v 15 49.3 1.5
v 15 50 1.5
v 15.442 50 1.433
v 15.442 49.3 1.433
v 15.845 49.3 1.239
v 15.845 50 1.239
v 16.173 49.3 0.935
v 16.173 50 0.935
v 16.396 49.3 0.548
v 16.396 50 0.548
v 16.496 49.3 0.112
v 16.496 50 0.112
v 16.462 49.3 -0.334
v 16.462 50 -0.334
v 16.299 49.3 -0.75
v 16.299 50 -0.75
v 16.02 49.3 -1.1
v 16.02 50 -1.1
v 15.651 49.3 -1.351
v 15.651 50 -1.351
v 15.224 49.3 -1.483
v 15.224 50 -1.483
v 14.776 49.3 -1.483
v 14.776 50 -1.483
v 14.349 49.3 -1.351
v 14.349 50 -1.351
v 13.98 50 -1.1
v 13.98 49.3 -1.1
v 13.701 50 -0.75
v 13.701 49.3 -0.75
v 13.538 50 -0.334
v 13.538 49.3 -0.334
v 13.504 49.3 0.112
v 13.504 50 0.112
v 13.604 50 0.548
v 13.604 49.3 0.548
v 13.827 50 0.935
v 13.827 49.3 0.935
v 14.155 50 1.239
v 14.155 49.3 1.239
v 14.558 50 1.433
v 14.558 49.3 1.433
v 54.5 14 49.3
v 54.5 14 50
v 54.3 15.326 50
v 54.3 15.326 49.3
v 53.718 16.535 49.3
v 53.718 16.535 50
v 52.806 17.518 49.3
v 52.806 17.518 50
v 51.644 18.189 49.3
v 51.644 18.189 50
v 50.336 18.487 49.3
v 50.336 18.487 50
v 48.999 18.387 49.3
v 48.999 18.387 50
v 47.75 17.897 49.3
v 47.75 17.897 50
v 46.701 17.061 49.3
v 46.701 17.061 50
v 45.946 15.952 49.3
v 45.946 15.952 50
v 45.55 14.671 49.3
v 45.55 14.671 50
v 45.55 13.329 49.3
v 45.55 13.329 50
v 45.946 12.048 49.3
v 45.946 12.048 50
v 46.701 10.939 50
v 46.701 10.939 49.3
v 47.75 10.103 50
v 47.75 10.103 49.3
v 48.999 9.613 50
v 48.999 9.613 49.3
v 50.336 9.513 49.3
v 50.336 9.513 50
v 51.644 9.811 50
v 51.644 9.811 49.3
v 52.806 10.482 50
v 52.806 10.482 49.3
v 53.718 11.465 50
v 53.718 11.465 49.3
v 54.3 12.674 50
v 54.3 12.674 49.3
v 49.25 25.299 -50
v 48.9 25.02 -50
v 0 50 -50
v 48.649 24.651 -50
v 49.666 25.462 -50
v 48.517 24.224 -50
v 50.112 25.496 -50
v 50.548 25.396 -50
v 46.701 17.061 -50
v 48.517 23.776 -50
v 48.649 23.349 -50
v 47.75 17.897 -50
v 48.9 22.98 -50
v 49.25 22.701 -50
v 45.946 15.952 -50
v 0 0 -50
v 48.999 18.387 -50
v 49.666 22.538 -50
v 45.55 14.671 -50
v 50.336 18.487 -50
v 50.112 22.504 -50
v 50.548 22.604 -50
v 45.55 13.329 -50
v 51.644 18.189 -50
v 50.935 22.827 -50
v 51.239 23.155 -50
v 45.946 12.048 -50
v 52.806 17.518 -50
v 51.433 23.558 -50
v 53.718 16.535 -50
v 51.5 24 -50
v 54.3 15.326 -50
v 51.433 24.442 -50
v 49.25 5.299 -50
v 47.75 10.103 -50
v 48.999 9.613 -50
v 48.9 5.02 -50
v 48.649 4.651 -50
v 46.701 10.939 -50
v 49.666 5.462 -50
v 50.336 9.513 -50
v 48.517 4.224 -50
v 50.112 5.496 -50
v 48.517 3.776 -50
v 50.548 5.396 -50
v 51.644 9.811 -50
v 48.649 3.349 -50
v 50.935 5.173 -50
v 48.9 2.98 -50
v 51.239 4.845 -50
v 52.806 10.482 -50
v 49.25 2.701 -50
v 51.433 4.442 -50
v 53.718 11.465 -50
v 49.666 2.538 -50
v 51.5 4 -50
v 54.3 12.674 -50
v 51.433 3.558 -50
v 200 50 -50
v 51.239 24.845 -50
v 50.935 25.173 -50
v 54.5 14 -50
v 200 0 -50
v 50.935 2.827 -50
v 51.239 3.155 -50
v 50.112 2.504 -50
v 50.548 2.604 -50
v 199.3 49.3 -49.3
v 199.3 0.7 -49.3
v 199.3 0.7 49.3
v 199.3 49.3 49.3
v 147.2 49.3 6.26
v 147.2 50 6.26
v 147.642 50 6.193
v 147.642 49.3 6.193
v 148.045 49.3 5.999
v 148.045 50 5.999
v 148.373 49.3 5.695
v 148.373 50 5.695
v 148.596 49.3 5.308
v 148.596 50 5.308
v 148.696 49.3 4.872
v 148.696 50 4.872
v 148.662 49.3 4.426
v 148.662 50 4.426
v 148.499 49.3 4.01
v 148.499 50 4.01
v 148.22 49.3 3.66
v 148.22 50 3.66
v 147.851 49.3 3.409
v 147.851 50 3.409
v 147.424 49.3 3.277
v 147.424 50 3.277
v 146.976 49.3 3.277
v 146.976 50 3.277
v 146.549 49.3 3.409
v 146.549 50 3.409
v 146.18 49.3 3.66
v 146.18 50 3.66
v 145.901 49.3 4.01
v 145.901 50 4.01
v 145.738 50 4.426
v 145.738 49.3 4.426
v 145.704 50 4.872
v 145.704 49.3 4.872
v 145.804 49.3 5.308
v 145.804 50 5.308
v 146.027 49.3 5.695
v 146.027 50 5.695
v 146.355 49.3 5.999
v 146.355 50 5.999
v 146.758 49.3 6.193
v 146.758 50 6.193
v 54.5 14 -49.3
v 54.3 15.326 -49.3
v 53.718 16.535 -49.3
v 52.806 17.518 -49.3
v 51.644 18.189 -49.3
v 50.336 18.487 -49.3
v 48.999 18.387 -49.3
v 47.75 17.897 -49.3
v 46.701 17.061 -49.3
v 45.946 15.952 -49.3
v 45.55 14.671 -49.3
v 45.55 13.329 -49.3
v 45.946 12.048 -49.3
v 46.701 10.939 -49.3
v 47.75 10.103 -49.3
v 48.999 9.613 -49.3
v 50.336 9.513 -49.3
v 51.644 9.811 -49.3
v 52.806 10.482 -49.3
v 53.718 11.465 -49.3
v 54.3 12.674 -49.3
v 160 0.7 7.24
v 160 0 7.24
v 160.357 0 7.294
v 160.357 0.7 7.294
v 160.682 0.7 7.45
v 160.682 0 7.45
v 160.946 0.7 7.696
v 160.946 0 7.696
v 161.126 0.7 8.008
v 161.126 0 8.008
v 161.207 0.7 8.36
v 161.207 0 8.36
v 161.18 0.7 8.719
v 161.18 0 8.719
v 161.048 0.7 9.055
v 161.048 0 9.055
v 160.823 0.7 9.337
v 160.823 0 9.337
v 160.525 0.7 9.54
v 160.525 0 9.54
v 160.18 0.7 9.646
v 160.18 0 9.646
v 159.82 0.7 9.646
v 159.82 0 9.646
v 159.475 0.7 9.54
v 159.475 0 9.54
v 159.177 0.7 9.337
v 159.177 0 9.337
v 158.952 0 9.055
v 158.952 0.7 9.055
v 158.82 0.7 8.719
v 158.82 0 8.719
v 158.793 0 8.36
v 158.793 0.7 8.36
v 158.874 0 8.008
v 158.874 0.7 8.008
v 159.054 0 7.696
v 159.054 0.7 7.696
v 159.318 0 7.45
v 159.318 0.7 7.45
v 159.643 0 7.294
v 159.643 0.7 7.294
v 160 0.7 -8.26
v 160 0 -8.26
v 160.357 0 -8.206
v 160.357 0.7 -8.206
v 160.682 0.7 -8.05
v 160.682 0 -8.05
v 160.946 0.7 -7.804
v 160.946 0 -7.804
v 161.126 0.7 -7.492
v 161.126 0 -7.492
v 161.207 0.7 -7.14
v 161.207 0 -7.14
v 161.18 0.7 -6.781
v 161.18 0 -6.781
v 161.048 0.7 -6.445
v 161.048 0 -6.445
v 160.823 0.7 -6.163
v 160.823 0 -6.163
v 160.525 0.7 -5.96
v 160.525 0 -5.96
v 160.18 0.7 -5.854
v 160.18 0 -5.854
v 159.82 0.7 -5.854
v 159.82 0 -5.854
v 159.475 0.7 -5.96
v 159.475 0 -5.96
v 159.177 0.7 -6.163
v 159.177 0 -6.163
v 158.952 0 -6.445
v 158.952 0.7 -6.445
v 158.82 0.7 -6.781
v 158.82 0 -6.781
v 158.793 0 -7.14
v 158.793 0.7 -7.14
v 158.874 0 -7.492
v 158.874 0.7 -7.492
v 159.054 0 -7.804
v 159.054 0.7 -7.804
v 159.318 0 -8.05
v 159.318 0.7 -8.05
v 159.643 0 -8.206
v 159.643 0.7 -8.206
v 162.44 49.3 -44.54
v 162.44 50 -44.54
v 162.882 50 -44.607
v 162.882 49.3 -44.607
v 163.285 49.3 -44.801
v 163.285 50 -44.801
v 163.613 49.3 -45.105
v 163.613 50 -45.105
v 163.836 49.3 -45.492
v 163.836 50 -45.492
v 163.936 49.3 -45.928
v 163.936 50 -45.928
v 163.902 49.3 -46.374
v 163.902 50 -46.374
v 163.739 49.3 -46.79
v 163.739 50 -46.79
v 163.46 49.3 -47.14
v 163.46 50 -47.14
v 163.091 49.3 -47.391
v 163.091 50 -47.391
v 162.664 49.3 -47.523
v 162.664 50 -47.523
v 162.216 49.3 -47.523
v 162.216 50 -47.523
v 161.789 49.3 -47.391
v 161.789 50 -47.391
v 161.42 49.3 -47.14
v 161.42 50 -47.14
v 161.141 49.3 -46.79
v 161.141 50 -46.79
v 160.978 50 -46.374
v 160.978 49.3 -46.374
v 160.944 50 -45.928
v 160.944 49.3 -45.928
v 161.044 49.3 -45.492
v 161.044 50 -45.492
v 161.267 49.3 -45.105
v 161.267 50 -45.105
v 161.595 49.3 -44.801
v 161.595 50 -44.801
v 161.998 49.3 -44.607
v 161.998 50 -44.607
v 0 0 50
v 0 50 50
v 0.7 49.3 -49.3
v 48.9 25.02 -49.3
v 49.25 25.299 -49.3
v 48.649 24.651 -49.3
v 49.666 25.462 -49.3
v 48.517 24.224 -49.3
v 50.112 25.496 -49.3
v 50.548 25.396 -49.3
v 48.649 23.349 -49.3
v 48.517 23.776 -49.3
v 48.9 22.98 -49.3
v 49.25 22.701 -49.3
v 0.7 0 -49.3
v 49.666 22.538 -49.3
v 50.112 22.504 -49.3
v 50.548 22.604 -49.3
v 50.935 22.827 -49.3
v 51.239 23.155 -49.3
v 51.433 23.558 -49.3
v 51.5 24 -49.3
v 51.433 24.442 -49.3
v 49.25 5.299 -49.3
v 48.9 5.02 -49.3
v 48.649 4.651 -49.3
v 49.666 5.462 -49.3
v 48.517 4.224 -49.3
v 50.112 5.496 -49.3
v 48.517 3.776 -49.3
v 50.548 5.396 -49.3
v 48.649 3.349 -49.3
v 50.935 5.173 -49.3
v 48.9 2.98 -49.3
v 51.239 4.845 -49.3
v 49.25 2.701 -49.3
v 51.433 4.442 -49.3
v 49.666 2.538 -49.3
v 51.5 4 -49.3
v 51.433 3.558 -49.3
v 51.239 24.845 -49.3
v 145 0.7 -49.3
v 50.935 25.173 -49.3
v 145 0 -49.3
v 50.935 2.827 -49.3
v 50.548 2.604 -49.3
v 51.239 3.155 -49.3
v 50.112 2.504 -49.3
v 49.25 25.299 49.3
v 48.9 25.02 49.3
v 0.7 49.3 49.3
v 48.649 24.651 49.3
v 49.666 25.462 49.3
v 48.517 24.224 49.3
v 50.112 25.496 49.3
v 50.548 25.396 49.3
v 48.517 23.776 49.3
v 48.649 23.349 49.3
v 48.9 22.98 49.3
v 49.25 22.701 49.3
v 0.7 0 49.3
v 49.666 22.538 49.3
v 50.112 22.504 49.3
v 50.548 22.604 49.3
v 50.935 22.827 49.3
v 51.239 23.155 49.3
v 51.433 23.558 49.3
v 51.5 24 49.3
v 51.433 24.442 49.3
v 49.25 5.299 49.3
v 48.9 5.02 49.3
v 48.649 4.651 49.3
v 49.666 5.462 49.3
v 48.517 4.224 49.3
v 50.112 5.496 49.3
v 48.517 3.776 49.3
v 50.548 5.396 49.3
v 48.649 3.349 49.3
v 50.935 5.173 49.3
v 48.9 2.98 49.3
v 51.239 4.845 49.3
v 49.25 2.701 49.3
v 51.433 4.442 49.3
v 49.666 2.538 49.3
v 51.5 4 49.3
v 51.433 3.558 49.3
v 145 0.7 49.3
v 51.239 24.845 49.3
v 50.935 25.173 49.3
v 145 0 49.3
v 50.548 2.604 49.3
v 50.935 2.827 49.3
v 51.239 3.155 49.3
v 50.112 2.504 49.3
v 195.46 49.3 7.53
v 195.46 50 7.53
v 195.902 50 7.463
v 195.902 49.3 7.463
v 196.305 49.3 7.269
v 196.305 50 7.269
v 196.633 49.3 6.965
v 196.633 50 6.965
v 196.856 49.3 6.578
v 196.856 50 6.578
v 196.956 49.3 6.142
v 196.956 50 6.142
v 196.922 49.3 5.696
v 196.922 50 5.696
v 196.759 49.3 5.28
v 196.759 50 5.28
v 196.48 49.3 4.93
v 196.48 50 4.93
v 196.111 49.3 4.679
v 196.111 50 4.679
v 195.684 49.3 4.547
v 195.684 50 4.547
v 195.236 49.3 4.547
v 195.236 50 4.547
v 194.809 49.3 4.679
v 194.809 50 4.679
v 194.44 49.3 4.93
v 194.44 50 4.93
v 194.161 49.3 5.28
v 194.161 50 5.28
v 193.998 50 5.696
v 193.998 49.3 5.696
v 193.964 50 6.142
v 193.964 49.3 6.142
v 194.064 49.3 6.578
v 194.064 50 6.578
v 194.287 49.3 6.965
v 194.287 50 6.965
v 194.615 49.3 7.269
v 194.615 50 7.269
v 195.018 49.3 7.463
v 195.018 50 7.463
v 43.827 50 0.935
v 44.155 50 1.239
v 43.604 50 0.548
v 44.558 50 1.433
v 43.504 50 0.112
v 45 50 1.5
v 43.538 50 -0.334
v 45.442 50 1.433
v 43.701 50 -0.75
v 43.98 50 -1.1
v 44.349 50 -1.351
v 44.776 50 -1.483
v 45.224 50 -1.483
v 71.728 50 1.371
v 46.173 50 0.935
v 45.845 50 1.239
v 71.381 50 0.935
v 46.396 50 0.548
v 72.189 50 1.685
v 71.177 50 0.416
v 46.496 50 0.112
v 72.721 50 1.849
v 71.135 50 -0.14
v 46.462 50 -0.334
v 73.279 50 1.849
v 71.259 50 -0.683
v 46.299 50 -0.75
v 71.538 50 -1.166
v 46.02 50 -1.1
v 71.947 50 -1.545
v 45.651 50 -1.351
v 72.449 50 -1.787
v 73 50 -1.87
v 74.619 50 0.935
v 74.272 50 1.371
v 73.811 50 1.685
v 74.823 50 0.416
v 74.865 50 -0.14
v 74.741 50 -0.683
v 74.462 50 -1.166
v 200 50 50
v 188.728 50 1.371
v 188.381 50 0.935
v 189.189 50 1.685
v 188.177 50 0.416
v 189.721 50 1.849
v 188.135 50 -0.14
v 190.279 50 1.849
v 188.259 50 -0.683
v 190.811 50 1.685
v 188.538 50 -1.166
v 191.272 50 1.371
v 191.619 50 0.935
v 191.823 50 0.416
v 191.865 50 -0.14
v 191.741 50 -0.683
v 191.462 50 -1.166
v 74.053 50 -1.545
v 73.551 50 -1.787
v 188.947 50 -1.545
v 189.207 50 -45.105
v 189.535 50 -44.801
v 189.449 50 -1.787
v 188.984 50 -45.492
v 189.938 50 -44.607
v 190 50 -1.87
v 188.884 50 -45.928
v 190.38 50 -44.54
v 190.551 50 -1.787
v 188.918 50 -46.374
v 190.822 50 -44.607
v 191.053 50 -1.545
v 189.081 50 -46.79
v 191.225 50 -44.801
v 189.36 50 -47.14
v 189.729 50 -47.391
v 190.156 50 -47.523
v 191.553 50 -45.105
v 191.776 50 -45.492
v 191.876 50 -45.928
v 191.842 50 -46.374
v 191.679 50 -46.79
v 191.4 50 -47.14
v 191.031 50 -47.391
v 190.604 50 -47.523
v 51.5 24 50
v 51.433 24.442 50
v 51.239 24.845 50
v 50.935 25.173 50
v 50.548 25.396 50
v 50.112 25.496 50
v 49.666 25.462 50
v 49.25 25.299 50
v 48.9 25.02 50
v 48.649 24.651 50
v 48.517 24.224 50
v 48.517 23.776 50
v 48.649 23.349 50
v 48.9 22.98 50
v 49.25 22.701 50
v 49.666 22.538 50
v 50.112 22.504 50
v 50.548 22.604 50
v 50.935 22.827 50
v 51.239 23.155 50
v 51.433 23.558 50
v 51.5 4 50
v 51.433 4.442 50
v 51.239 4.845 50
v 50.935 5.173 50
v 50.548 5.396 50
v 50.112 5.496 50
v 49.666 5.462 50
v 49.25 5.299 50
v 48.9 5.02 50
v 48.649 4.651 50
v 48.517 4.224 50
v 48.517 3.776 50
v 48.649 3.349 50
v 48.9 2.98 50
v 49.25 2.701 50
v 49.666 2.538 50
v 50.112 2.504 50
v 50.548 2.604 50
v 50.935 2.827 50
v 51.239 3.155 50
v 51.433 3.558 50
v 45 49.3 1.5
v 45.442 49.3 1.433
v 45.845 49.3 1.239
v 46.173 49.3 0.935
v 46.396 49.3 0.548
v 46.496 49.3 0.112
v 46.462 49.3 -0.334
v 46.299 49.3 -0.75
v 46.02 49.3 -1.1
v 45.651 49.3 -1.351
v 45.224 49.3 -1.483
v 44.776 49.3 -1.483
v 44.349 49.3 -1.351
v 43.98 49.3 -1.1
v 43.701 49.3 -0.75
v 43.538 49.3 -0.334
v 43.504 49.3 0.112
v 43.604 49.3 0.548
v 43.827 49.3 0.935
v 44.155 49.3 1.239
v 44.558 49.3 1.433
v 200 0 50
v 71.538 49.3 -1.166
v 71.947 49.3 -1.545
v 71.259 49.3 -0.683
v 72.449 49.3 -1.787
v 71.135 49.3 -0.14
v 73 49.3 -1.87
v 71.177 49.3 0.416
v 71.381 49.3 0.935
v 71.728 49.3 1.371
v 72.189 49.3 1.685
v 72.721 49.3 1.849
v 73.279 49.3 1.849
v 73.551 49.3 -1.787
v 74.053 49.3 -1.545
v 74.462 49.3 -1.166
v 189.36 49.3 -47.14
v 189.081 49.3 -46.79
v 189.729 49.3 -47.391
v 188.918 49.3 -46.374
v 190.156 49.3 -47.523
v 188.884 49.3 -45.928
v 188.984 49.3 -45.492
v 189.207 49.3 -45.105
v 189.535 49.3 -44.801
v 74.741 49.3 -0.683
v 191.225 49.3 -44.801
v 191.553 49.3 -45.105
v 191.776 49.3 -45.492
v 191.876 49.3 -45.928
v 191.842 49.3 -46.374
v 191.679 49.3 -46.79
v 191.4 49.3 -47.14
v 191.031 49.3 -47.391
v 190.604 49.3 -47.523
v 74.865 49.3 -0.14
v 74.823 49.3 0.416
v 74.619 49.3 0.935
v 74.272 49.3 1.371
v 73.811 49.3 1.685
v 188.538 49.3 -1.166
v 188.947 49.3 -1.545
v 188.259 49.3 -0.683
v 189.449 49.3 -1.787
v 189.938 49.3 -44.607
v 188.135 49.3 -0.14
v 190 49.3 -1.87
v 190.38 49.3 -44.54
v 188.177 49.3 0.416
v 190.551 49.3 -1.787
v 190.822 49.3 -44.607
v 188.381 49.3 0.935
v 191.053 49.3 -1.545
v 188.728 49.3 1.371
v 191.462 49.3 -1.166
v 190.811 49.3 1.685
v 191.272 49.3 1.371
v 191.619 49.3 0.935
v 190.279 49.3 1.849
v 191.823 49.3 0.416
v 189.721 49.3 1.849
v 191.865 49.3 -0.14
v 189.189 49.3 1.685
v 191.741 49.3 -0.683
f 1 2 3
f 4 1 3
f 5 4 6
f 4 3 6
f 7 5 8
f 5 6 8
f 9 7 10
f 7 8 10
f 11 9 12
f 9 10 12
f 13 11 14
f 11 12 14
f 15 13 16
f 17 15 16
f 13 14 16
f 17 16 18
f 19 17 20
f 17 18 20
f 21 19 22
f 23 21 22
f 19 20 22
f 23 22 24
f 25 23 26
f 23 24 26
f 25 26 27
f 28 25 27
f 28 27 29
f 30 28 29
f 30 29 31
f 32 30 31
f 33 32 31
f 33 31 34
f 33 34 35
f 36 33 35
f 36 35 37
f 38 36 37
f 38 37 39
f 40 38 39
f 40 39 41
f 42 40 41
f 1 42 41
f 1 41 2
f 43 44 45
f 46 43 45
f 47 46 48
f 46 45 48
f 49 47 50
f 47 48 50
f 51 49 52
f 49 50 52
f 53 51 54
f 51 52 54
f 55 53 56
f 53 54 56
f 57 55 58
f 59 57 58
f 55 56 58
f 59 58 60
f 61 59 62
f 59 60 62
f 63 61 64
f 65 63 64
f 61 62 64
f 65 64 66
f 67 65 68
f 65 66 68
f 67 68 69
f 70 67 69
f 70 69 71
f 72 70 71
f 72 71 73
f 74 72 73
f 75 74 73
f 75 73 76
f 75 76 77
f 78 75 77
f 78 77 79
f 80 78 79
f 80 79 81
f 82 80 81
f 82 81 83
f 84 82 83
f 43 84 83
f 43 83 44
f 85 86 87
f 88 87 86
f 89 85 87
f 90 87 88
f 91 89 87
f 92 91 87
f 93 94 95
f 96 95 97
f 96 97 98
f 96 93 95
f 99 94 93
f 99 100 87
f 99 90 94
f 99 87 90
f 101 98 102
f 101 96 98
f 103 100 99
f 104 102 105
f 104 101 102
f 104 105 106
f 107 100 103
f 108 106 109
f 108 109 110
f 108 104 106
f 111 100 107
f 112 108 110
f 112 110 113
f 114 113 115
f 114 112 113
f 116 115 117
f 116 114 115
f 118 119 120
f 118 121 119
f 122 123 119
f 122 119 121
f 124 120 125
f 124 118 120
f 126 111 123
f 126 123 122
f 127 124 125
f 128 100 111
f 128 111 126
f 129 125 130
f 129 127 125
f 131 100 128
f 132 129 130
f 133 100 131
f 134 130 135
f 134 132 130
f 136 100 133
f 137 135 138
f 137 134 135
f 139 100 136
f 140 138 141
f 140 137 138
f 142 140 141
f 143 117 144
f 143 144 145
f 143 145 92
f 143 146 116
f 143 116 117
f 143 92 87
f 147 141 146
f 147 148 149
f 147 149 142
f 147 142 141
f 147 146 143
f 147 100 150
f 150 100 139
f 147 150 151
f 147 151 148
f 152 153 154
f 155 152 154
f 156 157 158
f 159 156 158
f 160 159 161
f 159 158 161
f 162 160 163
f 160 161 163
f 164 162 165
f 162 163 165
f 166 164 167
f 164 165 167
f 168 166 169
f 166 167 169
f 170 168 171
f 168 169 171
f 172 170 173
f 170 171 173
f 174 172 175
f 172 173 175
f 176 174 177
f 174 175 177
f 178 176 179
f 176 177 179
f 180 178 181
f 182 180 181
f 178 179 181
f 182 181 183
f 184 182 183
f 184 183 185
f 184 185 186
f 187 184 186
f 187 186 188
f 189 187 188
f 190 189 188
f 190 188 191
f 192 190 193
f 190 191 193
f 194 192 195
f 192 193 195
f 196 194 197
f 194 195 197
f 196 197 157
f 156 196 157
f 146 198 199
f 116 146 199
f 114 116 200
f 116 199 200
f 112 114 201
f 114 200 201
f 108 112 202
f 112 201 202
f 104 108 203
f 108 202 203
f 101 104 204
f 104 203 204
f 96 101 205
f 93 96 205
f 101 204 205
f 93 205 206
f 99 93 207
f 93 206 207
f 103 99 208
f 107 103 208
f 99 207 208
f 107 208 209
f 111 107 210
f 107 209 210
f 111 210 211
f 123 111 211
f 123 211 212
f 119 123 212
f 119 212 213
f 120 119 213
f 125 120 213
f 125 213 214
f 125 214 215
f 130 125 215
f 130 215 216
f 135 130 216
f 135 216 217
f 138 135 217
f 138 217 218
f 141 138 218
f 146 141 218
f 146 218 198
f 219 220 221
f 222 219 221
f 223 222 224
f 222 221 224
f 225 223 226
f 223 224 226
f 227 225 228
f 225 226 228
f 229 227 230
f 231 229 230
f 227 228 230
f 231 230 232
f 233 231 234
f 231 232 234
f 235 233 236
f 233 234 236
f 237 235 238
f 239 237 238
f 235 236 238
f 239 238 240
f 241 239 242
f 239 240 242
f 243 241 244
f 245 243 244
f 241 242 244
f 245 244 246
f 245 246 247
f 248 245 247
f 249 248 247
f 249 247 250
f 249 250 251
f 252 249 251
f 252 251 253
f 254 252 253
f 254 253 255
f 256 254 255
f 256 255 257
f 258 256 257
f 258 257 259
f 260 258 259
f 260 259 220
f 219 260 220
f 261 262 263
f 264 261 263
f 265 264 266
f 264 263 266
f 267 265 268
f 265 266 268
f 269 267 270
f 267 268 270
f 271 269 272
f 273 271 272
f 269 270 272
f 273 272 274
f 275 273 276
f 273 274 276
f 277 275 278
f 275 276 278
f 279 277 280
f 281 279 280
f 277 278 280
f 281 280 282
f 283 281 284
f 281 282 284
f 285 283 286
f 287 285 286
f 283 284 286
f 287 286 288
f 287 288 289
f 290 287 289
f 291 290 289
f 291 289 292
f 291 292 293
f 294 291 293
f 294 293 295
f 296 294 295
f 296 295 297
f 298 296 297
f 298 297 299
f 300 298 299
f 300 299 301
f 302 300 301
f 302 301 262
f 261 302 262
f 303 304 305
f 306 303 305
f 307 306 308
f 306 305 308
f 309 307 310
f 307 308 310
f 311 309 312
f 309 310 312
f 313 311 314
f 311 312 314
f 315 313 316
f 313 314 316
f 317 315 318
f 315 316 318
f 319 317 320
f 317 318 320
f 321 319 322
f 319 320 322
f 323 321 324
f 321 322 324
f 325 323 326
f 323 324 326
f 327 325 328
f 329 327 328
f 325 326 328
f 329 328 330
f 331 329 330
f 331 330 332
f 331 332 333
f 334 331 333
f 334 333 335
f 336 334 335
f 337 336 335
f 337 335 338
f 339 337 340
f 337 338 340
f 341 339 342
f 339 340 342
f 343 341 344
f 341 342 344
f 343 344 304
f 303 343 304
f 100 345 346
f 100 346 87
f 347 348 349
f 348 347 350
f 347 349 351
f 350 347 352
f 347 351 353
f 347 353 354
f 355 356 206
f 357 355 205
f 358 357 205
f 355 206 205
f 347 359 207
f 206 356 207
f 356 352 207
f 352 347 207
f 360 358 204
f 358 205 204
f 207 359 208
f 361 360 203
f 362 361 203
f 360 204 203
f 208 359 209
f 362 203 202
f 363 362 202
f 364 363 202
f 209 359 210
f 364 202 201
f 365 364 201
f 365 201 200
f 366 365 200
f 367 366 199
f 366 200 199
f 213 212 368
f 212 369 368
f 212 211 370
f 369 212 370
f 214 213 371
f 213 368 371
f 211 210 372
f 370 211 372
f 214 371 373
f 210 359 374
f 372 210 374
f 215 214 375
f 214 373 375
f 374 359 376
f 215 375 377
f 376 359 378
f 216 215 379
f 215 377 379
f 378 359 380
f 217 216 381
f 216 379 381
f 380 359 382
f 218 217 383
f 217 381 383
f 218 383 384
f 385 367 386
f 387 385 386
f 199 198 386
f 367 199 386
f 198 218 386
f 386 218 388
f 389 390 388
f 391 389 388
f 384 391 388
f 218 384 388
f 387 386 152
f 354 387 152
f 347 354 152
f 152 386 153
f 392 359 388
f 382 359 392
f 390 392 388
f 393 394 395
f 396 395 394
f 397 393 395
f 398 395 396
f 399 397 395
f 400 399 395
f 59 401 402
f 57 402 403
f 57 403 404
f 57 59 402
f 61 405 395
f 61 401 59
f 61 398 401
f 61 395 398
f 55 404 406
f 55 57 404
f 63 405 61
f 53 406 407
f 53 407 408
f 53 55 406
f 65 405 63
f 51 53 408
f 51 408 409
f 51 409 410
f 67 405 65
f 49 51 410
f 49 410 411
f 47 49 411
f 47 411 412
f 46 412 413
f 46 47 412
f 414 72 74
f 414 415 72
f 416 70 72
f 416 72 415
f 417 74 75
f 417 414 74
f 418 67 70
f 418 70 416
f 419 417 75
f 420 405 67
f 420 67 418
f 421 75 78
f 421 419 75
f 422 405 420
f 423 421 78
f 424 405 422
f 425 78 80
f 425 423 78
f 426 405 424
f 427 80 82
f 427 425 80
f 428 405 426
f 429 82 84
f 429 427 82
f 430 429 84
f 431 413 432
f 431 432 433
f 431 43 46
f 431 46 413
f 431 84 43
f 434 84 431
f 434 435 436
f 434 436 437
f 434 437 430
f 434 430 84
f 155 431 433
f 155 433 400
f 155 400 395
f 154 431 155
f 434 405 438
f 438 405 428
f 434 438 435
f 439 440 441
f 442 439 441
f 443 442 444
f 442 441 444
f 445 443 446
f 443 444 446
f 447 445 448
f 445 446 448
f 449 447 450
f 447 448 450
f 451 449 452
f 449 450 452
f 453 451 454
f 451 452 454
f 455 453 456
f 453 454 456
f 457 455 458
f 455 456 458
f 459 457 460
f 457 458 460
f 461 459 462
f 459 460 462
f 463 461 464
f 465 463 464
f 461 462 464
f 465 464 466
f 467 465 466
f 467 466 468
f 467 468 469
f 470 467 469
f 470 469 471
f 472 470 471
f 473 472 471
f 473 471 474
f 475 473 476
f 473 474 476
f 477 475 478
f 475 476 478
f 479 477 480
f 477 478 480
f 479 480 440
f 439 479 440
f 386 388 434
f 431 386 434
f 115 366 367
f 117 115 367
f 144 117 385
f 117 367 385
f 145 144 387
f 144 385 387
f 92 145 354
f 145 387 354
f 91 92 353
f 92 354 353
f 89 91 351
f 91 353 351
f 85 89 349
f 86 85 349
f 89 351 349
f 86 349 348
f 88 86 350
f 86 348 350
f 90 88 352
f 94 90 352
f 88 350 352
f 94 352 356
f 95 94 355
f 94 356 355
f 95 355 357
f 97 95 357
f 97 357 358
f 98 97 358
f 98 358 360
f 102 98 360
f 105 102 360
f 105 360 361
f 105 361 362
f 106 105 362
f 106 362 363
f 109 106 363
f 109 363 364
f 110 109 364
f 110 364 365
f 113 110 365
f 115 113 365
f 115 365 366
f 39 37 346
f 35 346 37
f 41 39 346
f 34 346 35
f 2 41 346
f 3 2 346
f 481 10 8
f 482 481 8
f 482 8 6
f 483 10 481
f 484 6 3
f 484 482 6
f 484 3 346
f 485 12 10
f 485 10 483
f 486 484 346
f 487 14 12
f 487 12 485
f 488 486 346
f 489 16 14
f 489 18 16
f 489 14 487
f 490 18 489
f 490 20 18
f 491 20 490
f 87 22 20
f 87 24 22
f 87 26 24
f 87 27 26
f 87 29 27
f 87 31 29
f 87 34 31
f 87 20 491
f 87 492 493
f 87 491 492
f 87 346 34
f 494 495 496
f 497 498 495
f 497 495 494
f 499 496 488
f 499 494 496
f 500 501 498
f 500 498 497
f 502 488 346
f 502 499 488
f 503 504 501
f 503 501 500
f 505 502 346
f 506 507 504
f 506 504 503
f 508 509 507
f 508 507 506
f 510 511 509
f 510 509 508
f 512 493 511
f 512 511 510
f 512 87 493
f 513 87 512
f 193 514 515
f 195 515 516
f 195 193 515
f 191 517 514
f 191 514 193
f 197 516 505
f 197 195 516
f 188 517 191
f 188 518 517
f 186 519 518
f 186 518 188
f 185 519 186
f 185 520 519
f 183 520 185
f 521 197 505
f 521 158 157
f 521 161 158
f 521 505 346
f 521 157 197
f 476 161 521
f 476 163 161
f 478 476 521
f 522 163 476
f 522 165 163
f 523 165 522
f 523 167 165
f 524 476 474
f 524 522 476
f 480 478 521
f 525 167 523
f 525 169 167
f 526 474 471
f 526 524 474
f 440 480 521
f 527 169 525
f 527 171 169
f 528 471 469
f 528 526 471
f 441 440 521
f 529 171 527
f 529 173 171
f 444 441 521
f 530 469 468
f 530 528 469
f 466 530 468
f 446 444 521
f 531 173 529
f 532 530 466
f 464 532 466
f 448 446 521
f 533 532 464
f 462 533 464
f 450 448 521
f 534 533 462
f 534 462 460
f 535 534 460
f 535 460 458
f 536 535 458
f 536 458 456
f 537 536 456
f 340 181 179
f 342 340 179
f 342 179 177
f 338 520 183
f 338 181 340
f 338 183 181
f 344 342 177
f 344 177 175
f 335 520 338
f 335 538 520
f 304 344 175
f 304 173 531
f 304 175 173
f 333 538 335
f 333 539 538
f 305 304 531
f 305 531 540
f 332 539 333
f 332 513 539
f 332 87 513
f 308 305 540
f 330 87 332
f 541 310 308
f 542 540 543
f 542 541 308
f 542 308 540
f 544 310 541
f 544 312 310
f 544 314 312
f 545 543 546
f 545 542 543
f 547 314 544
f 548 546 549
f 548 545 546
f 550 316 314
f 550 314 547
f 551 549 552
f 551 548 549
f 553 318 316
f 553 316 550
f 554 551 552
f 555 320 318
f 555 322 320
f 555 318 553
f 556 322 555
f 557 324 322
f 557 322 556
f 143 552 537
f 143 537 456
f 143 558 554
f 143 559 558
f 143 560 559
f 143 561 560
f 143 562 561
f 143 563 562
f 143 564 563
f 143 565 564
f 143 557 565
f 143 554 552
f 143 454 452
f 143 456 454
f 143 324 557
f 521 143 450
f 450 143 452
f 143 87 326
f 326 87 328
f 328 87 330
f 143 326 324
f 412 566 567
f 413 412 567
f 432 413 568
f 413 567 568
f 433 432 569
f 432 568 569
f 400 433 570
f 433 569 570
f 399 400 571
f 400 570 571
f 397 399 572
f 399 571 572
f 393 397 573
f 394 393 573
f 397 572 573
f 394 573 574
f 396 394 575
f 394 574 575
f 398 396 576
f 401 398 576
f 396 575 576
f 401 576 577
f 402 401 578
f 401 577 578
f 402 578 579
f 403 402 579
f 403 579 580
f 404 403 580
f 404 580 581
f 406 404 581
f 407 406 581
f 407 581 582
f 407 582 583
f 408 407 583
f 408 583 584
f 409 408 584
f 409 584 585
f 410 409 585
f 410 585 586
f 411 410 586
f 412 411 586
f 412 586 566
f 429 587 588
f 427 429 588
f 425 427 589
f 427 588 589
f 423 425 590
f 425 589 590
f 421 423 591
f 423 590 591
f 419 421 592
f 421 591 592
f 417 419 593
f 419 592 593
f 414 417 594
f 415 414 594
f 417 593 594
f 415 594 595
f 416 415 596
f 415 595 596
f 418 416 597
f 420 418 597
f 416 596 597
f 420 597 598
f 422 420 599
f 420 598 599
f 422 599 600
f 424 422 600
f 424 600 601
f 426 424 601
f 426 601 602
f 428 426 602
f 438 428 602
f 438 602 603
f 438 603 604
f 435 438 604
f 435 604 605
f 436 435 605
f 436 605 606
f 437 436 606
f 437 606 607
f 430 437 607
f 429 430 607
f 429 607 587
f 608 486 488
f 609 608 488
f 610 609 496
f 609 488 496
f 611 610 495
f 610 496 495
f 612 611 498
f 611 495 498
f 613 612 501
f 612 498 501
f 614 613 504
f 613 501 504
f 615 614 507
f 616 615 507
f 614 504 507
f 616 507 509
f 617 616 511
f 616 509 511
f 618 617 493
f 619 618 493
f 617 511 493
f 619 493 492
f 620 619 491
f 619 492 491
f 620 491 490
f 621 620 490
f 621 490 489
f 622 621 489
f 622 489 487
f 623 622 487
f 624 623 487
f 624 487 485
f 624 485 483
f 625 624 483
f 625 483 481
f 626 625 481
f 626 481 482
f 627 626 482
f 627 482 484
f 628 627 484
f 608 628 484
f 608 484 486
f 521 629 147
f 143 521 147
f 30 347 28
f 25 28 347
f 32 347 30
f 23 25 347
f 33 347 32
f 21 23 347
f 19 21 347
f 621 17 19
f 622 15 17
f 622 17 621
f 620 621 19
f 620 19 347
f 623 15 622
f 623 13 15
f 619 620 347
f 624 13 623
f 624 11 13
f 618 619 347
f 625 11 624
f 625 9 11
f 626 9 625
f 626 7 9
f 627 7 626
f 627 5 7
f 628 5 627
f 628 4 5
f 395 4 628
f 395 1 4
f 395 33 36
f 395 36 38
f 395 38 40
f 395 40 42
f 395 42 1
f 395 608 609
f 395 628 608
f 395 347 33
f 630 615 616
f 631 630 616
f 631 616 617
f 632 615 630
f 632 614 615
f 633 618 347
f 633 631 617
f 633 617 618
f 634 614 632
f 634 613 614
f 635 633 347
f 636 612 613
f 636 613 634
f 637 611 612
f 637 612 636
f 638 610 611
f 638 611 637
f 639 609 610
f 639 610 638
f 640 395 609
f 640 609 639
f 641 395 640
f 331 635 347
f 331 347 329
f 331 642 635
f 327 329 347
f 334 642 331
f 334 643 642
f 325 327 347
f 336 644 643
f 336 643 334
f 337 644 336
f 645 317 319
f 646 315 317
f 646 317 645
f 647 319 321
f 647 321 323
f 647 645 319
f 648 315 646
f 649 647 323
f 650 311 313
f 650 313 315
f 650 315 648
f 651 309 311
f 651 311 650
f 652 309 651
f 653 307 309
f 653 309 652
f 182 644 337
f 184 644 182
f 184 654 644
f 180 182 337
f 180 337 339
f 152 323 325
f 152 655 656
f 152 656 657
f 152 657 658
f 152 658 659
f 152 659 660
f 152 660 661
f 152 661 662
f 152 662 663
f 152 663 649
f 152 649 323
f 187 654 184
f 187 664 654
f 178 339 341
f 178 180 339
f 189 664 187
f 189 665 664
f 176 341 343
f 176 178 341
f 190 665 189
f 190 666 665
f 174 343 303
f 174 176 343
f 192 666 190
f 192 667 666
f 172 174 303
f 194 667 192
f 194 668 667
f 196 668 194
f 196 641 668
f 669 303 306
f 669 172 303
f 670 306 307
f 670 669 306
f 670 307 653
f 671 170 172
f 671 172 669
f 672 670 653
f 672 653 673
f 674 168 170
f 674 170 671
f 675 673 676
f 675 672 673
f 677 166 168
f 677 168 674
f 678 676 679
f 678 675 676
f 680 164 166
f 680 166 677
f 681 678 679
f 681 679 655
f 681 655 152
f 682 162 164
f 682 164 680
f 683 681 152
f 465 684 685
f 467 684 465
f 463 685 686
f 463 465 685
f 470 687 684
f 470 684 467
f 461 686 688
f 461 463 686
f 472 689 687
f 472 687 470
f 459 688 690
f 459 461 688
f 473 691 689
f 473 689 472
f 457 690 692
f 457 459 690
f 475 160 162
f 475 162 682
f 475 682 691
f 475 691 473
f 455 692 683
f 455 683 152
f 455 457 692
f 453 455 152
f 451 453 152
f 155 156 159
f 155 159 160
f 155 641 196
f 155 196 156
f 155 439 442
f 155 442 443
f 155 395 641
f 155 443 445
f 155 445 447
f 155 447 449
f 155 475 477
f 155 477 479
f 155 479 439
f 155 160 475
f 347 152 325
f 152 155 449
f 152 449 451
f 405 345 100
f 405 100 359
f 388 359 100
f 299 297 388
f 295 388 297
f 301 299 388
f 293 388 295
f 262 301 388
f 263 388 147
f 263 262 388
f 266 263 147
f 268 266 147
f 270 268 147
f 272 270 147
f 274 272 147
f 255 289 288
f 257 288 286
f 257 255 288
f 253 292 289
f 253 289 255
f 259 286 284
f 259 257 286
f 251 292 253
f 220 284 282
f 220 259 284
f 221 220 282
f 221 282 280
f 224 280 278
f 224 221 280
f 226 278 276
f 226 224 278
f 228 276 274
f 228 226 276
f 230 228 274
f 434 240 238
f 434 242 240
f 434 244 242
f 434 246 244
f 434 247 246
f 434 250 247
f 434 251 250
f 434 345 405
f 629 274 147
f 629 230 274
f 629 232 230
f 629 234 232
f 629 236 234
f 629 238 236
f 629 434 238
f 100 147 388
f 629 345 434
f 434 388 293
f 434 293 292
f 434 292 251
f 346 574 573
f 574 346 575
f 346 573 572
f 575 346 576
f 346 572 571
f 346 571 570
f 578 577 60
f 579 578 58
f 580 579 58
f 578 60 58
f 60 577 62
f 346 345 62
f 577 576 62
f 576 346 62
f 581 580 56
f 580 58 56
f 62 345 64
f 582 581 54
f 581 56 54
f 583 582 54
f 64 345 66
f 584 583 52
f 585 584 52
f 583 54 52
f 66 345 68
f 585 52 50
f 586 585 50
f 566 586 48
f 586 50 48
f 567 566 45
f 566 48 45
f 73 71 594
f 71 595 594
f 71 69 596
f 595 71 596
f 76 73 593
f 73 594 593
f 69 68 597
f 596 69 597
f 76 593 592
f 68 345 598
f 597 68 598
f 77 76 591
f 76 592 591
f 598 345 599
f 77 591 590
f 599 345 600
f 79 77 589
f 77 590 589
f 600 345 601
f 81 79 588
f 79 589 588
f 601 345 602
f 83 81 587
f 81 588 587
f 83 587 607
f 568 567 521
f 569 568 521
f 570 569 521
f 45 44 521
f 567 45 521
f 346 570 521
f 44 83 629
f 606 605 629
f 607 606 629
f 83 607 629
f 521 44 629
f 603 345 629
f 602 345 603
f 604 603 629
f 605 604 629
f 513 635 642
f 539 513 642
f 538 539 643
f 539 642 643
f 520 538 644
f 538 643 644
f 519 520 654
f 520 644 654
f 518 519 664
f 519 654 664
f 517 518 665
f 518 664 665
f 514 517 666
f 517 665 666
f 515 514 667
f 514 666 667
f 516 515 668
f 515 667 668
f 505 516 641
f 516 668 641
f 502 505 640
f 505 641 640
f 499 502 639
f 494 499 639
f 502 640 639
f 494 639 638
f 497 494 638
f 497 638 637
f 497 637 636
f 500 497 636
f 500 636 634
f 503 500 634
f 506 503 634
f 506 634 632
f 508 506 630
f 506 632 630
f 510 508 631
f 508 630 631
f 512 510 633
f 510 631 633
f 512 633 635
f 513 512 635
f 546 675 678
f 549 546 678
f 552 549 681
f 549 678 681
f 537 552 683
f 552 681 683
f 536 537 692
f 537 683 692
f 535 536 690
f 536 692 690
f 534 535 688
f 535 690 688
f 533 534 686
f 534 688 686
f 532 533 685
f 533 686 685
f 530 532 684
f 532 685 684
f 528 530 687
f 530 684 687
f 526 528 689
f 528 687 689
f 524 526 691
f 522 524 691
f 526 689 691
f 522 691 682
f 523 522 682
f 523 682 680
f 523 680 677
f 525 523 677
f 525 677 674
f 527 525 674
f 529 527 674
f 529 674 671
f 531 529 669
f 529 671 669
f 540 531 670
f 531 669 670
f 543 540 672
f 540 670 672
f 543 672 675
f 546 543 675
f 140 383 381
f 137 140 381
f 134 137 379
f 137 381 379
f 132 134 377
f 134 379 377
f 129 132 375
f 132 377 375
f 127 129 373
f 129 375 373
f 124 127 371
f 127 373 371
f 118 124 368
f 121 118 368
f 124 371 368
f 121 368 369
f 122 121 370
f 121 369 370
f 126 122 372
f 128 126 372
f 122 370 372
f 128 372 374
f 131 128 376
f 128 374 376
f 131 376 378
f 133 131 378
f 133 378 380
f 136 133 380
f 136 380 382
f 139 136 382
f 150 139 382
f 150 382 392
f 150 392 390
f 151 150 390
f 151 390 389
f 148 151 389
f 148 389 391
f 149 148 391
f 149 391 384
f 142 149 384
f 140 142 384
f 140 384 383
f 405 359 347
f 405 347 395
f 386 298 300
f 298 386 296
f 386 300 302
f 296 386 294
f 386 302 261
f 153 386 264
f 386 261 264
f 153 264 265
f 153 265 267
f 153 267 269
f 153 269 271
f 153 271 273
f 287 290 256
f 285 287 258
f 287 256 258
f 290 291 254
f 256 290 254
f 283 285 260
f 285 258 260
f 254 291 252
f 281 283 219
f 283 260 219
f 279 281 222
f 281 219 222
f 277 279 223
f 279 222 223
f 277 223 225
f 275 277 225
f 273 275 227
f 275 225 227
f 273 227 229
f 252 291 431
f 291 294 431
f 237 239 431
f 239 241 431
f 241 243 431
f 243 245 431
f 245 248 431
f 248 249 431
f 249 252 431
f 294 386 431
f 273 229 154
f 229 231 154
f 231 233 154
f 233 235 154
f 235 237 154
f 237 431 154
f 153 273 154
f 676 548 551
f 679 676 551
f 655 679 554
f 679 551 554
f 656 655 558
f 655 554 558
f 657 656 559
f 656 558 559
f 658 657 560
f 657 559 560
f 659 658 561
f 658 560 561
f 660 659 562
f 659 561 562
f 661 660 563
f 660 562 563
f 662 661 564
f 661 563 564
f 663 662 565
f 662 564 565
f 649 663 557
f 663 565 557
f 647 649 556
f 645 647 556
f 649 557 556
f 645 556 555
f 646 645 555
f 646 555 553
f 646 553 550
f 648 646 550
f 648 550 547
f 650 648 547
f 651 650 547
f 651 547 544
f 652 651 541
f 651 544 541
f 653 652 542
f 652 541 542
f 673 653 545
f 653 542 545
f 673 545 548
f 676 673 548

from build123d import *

# Parameters (mm, degrees)
SKETCH1_W           = 200
SKETCH1_H           = 100
BOSS_EXTRUDE1_DEPTH = 50
SKETCH3_W           = 198.6
SKETCH3_H           = 98.6
CUT_EXTRUDE1_DEPTH  = 49.3
SKETCH4_W           = 54.3
SKETCH4_H           = 98.6
BOSS_EXTRUDE2_DEPTH = 0.7
SKETCH2_R           = 4.5
SKETCH2_R_2         = 1.5
CUT_EXTRUDE2_DEPTH  = 230.128784748
SKETCH8_R           = 1.21
CUT_EXTRUDE6_DEPTH  = 1.8
SKETCH10_R          = 1.87
CUT_EXTRUDE8_DEPTH  = 0.7
SKETCH9_R           = 1.5
CUT_EXTRUDE7_DEPTH  = 213.132034356
SKETCH11_R          = 1.5
CUT_EXTRUDE9_DEPTH  = 0.7


with BuildPart() as part:
    # Sketch1 → Boss-Extrude1 (new body)
    with BuildSketch(Plane(origin=(0, 0, 0), x_dir=(1, 0, 0), z_dir=(0, 1, 0))):
        with Locations((100, 0)):
            Rectangle(SKETCH1_W, SKETCH1_H)
    extrude(amount=BOSS_EXTRUDE1_DEPTH)

    # Sketch3 → Cut-Extrude1 (cut)
    with BuildSketch(Plane.XZ):
        with Locations((100, 0)):
            Rectangle(SKETCH3_W, SKETCH3_H)
    extrude(amount=-CUT_EXTRUDE1_DEPTH, mode=Mode.SUBTRACT)

    # Sketch4 → Boss-Extrude2 (add)
    with BuildSketch(Plane.XZ):
        with Locations((172.15, 0)):
            Rectangle(SKETCH4_W, SKETCH4_H)
    extrude(amount=-BOSS_EXTRUDE2_DEPTH)

    # Sketch2 → Cut-Extrude2 (cut, through all)
    with BuildSketch(Plane.XY.offset(50)):
        with Locations((50, 14)):
            Circle(SKETCH2_R)
        with Locations((50, 4)):
            Circle(SKETCH2_R_2)
        with Locations((50, 24)):
            Circle(SKETCH2_R_2)
    extrude(amount=-CUT_EXTRUDE2_DEPTH, mode=Mode.SUBTRACT)

    # Sketch8 → Cut-Extrude6 (cut)
    with BuildSketch(Plane.XZ):
        with Locations(Location((160, 8.45, 0), (0, 0, 270))):
            Circle(SKETCH8_R)
        with Locations(Location((160, -7.05, 0), (0, 0, 270))):
            Circle(SKETCH8_R)
    extrude(amount=-CUT_EXTRUDE6_DEPTH, mode=Mode.SUBTRACT)

    # Sketch10 → Cut-Extrude8 (cut)
    with BuildSketch(Plane.XZ.offset(-49.3)):
        with Locations(Location((190, 0, 0), (0, 0, 270))):
            Circle(SKETCH10_R)
        with Locations(Location((73, 0, 0), (0, 0, 270))):
            Circle(SKETCH10_R)
    extrude(amount=-CUT_EXTRUDE8_DEPTH, mode=Mode.SUBTRACT)

    # Sketch9 → Cut-Extrude7 (cut, through all)
    with BuildSketch(Plane(origin=(0, 50, 0), x_dir=(1, 0, 0), z_dir=(0, 1, 0))):
        with Locations(Location((15, 0, 0), (0, 0, 270))):
            Circle(SKETCH9_R)
        with Locations(Location((45, 0, 0), (0, 0, 270))):
            Circle(SKETCH9_R)
    extrude(amount=-CUT_EXTRUDE7_DEPTH, mode=Mode.SUBTRACT)

    # Sketch11 → Cut-Extrude9 (cut)
    with BuildSketch(Plane(origin=(143.38, 50, -175.08), x_dir=(0, 0, 1), z_dir=(0, 1, 0))):
        with Locations((129.04, 47)):
            Circle(SKETCH11_R)
        with Locations((181.11, 52.08)):
            Circle(SKETCH11_R)
        with Locations((179.84, 3.82)):
            Circle(SKETCH11_R)
        with Locations((129.04, 19.06)):
            Circle(SKETCH11_R)
    extrude(amount=-CUT_EXTRUDE9_DEPTH, mode=Mode.SUBTRACT)


solid = part.part
